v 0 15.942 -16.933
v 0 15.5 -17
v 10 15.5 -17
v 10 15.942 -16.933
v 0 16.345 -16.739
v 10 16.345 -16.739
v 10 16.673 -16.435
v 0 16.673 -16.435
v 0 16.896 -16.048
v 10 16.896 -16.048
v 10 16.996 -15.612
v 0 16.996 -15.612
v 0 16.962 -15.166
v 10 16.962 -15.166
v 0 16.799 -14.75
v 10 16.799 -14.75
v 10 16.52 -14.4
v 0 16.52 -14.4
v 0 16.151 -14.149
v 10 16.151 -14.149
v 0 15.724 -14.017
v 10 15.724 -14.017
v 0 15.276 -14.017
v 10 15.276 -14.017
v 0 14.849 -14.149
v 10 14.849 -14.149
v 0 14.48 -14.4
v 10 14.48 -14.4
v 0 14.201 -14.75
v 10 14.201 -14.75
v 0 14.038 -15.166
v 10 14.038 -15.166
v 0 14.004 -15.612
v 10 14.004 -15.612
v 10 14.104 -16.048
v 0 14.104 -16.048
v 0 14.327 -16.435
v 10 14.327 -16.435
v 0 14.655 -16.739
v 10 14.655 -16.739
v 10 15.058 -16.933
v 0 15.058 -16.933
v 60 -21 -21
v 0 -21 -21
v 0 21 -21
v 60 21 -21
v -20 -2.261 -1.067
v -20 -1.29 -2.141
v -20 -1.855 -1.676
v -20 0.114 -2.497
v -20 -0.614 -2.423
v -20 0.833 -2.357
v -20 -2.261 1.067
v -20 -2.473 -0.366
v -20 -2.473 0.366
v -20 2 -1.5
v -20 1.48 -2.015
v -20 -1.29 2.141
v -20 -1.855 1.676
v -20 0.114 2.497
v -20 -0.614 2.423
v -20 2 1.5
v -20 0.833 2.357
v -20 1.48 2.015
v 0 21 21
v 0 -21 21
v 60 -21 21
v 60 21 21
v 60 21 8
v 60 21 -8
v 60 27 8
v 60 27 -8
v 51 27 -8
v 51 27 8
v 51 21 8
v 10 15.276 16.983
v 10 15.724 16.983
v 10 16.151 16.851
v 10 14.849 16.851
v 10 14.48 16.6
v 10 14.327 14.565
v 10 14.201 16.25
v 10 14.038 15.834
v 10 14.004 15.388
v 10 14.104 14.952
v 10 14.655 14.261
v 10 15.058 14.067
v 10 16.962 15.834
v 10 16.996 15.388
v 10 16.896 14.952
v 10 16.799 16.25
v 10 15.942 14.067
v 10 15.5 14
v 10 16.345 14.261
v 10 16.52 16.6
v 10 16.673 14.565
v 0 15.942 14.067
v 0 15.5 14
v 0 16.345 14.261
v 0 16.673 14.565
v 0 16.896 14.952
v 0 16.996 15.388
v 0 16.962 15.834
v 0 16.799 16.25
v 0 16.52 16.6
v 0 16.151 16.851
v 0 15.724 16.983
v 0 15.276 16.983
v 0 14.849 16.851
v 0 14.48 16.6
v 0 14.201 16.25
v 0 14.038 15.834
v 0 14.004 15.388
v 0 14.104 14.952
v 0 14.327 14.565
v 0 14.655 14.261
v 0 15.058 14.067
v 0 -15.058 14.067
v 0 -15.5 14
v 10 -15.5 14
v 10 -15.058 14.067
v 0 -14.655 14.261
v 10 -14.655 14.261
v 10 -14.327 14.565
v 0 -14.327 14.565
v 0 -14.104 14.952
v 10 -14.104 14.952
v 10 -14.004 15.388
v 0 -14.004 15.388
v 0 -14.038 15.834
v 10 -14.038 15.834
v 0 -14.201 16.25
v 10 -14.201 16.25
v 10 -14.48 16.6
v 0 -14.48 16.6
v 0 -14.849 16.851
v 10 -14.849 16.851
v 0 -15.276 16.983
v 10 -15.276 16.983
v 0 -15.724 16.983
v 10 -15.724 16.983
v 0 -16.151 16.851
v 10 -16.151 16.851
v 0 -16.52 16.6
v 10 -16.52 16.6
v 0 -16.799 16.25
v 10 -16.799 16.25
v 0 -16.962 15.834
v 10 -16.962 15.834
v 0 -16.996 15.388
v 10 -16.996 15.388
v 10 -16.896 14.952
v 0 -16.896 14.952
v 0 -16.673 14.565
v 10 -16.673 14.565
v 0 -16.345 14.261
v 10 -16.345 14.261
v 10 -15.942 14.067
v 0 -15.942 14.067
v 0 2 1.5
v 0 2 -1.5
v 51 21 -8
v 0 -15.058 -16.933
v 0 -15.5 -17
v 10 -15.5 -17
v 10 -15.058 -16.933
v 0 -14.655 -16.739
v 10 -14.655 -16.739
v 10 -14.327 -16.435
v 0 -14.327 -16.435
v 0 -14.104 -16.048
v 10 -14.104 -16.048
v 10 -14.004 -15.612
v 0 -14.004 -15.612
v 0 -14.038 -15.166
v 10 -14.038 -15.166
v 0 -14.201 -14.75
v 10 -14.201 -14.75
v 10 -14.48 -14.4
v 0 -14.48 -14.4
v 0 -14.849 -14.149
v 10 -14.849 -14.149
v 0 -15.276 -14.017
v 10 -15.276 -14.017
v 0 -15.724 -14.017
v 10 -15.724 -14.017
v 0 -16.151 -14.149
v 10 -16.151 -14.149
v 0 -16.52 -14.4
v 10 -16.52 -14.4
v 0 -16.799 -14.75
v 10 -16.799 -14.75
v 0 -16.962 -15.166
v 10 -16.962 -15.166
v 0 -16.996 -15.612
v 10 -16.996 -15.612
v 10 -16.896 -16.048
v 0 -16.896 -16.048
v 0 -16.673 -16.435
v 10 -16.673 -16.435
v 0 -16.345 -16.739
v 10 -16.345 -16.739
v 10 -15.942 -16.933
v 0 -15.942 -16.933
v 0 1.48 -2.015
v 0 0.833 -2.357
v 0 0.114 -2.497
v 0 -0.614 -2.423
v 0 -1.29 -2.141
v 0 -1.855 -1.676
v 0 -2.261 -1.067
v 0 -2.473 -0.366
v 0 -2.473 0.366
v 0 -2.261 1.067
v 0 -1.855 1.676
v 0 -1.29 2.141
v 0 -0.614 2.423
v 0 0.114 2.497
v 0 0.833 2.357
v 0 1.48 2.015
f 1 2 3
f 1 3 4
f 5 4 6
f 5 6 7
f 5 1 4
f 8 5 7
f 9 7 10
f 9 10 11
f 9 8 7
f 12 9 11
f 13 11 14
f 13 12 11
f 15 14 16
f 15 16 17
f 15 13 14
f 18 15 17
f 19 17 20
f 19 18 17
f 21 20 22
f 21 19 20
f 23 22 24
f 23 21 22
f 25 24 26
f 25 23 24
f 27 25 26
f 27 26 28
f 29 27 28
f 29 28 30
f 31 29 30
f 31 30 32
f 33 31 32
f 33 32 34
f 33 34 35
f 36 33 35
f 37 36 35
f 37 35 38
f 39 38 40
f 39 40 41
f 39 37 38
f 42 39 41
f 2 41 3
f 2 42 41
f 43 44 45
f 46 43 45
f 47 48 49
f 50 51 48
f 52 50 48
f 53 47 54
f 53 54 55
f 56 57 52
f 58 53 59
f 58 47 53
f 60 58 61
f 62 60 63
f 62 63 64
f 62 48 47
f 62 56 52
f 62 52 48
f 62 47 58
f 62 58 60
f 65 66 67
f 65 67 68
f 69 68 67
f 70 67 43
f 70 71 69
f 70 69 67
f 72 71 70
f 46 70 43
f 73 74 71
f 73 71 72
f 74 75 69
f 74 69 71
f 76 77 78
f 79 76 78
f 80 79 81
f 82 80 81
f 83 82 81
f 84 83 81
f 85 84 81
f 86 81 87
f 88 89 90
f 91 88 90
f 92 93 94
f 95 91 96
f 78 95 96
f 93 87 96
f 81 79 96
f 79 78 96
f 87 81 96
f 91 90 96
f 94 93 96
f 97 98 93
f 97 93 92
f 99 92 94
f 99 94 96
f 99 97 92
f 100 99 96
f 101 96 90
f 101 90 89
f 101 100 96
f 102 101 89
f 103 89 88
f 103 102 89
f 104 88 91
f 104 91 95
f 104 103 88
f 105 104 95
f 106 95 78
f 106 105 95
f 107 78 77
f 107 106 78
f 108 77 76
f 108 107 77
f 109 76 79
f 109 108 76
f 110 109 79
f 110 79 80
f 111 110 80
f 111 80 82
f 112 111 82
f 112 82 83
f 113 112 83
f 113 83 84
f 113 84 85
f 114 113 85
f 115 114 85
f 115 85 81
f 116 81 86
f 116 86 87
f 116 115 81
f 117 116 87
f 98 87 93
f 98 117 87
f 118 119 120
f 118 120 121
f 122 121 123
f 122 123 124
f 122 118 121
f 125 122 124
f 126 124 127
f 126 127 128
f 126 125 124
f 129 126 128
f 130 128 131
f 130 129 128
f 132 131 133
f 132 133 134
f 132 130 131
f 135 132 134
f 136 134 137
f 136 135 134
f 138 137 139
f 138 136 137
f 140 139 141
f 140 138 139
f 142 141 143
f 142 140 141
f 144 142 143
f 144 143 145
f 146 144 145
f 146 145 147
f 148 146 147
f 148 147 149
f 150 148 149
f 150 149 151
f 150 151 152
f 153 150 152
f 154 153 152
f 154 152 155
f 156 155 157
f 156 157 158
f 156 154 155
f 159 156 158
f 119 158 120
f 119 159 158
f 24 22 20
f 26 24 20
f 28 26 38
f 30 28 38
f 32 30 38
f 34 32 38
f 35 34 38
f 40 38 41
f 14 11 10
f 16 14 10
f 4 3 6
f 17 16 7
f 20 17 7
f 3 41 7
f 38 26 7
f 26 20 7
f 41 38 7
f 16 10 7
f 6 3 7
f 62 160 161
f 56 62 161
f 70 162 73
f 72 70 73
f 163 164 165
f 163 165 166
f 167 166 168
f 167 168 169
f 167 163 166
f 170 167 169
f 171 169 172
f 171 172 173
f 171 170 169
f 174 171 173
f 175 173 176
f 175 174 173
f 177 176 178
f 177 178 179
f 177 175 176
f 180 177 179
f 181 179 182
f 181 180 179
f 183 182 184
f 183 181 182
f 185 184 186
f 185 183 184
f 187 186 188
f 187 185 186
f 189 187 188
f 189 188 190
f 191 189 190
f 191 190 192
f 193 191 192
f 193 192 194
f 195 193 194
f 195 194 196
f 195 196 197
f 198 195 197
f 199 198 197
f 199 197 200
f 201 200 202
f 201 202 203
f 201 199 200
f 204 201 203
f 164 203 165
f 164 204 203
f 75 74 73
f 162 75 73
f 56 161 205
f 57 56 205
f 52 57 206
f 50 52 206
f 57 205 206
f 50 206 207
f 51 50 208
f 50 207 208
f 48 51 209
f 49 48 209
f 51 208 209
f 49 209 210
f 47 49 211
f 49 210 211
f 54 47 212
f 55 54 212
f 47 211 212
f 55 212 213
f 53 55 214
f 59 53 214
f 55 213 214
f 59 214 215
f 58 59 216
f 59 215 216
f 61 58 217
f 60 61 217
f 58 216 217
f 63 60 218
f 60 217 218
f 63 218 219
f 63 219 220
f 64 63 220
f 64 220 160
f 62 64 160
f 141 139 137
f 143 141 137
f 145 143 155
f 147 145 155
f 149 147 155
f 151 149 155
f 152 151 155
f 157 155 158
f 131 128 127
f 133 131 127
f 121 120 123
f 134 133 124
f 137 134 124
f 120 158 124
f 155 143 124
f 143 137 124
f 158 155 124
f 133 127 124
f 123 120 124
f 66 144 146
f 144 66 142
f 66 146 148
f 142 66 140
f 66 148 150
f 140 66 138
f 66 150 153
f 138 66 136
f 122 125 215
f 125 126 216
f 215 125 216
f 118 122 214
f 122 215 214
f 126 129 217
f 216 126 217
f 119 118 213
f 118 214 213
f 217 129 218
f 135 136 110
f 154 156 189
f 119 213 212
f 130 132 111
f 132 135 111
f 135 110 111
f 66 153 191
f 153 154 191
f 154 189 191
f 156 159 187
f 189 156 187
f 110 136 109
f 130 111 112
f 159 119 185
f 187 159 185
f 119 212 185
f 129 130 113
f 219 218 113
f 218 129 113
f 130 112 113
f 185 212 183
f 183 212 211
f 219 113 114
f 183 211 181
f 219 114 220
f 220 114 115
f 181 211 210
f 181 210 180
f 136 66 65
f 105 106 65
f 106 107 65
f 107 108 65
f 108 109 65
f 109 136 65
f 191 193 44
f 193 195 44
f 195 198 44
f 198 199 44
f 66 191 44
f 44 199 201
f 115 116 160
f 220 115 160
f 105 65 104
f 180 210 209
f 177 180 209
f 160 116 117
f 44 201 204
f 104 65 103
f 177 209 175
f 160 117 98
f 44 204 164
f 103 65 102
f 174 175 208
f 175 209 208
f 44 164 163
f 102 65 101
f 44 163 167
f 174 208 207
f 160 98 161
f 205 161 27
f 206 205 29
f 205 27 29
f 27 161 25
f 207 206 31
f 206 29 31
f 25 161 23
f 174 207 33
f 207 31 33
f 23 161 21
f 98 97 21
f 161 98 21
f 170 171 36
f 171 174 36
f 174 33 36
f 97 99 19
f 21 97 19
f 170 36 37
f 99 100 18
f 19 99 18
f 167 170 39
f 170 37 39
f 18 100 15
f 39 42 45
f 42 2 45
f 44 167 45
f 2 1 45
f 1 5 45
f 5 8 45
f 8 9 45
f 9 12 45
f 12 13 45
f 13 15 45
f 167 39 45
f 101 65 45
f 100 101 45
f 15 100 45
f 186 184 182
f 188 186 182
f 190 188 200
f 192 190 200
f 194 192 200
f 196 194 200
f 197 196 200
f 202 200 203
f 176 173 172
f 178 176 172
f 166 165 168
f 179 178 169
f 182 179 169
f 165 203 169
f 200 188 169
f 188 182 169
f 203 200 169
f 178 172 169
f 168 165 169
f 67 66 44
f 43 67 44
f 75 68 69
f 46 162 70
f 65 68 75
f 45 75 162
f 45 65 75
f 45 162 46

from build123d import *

# Parameters (mm, degrees)
SKETCH_2_W          = 42
SKETCH_2_H          = 42
SKETCH_2_R          = 1.5
EXTRUDE_1_DEPTH     = 60
EXTRUDE_2_DEPTH     = 20
SKETCH_2_4_W        = 16
SKETCH_2_4_H        = 6
EXTRUDE_3_DEPTH     = 60
SKETCH_2_5_W        = 16
SKETCH_2_5_H        = 6
CUT_EXTRUDE_1_DEPTH = 51
SKETCH_2_6_R        = 1.5
EXTRUDE_4_DEPTH     = 60
SKETCH_2_7_R        = 1.5
CUT_EXTRUDE_2_DEPTH = 10


with BuildPart() as part:
    # 草图2 → 凸台-拉伸1 (new body)
    with BuildSketch(Plane(origin=(0, 0, 0), x_dir=(0, 0, -1), z_dir=(1, 0, 0))):
        Rectangle(SKETCH_2_W, SKETCH_2_H)
        with Locations((-15.5, -15.5)):
            Circle(SKETCH_2_R, mode=Mode.SUBTRACT)
        with Locations((15.5, -15.5)):
            Circle(SKETCH_2_R, mode=Mode.SUBTRACT)
        with Locations((-15.5, 15.5)):
            Circle(SKETCH_2_R, mode=Mode.SUBTRACT)
        with Locations((15.5, 15.5)):
            Circle(SKETCH_2_R, mode=Mode.SUBTRACT)
    extrude(amount=EXTRUDE_1_DEPTH)

    # 草图2<3> → 凸台-拉伸2 (add)
    with BuildSketch(Plane(origin=(0, 0, 0), x_dir=(0, 0, -1), z_dir=(1, 0, 0))):
        with BuildLine():
            Line((1.5, 2), (-1.5, 2))
            ThreePointArc((-1.5, 2), (0, -2.5), (1.5, 2))
        make_face()
    extrude(amount=-EXTRUDE_2_DEPTH)

    # 草图2<4> → 凸台-拉伸3 (add)
    with BuildSketch(Plane(origin=(0, 0, 0), x_dir=(0, 0, -1), z_dir=(1, 0, 0))):
        with Locations((0, 24)):
            Rectangle(SKETCH_2_4_W, SKETCH_2_4_H)
    extrude(amount=EXTRUDE_3_DEPTH)

    # 草图2<5> → 切除-拉伸1 (cut)
    with BuildSketch(Plane(origin=(0, 0, 0), x_dir=(0, 0, -1), z_dir=(1, 0, 0))):
        with Locations((0, 24)):
            Rectangle(SKETCH_2_5_W, SKETCH_2_5_H)
    extrude(amount=CUT_EXTRUDE_1_DEPTH, mode=Mode.SUBTRACT)

    # 草图2<6> → 凸台-拉伸4 (add)
    with BuildSketch(Plane(origin=(0, 0, 0), x_dir=(0, 0, -1), z_dir=(1, 0, 0))):
        with Locations((15.5, 15.5)):
            Circle(SKETCH_2_6_R)
        with Locations((15.5, -15.5)):
            Circle(SKETCH_2_6_R)
        with Locations((-15.5, -15.5)):
            Circle(SKETCH_2_6_R)
        with Locations((-15.5, 15.5)):
            Circle(SKETCH_2_6_R)
    extrude(amount=EXTRUDE_4_DEPTH)

    # 草图2<7> → 切除-拉伸2 (cut)
    with BuildSketch(Plane(origin=(0, 0, 0), x_dir=(0, 0, -1), z_dir=(1, 0, 0))):
        with Locations((15.5, 15.5)):
            Circle(SKETCH_2_7_R)
        with Locations((15.5, -15.5)):
            Circle(SKETCH_2_7_R)
        with Locations((-15.5, -15.5)):
            Circle(SKETCH_2_7_R)
        with Locations((-15.5, 15.5)):
            Circle(SKETCH_2_7_R)
    extrude(amount=CUT_EXTRUDE_2_DEPTH, mode=Mode.SUBTRACT)


solid = part.part
